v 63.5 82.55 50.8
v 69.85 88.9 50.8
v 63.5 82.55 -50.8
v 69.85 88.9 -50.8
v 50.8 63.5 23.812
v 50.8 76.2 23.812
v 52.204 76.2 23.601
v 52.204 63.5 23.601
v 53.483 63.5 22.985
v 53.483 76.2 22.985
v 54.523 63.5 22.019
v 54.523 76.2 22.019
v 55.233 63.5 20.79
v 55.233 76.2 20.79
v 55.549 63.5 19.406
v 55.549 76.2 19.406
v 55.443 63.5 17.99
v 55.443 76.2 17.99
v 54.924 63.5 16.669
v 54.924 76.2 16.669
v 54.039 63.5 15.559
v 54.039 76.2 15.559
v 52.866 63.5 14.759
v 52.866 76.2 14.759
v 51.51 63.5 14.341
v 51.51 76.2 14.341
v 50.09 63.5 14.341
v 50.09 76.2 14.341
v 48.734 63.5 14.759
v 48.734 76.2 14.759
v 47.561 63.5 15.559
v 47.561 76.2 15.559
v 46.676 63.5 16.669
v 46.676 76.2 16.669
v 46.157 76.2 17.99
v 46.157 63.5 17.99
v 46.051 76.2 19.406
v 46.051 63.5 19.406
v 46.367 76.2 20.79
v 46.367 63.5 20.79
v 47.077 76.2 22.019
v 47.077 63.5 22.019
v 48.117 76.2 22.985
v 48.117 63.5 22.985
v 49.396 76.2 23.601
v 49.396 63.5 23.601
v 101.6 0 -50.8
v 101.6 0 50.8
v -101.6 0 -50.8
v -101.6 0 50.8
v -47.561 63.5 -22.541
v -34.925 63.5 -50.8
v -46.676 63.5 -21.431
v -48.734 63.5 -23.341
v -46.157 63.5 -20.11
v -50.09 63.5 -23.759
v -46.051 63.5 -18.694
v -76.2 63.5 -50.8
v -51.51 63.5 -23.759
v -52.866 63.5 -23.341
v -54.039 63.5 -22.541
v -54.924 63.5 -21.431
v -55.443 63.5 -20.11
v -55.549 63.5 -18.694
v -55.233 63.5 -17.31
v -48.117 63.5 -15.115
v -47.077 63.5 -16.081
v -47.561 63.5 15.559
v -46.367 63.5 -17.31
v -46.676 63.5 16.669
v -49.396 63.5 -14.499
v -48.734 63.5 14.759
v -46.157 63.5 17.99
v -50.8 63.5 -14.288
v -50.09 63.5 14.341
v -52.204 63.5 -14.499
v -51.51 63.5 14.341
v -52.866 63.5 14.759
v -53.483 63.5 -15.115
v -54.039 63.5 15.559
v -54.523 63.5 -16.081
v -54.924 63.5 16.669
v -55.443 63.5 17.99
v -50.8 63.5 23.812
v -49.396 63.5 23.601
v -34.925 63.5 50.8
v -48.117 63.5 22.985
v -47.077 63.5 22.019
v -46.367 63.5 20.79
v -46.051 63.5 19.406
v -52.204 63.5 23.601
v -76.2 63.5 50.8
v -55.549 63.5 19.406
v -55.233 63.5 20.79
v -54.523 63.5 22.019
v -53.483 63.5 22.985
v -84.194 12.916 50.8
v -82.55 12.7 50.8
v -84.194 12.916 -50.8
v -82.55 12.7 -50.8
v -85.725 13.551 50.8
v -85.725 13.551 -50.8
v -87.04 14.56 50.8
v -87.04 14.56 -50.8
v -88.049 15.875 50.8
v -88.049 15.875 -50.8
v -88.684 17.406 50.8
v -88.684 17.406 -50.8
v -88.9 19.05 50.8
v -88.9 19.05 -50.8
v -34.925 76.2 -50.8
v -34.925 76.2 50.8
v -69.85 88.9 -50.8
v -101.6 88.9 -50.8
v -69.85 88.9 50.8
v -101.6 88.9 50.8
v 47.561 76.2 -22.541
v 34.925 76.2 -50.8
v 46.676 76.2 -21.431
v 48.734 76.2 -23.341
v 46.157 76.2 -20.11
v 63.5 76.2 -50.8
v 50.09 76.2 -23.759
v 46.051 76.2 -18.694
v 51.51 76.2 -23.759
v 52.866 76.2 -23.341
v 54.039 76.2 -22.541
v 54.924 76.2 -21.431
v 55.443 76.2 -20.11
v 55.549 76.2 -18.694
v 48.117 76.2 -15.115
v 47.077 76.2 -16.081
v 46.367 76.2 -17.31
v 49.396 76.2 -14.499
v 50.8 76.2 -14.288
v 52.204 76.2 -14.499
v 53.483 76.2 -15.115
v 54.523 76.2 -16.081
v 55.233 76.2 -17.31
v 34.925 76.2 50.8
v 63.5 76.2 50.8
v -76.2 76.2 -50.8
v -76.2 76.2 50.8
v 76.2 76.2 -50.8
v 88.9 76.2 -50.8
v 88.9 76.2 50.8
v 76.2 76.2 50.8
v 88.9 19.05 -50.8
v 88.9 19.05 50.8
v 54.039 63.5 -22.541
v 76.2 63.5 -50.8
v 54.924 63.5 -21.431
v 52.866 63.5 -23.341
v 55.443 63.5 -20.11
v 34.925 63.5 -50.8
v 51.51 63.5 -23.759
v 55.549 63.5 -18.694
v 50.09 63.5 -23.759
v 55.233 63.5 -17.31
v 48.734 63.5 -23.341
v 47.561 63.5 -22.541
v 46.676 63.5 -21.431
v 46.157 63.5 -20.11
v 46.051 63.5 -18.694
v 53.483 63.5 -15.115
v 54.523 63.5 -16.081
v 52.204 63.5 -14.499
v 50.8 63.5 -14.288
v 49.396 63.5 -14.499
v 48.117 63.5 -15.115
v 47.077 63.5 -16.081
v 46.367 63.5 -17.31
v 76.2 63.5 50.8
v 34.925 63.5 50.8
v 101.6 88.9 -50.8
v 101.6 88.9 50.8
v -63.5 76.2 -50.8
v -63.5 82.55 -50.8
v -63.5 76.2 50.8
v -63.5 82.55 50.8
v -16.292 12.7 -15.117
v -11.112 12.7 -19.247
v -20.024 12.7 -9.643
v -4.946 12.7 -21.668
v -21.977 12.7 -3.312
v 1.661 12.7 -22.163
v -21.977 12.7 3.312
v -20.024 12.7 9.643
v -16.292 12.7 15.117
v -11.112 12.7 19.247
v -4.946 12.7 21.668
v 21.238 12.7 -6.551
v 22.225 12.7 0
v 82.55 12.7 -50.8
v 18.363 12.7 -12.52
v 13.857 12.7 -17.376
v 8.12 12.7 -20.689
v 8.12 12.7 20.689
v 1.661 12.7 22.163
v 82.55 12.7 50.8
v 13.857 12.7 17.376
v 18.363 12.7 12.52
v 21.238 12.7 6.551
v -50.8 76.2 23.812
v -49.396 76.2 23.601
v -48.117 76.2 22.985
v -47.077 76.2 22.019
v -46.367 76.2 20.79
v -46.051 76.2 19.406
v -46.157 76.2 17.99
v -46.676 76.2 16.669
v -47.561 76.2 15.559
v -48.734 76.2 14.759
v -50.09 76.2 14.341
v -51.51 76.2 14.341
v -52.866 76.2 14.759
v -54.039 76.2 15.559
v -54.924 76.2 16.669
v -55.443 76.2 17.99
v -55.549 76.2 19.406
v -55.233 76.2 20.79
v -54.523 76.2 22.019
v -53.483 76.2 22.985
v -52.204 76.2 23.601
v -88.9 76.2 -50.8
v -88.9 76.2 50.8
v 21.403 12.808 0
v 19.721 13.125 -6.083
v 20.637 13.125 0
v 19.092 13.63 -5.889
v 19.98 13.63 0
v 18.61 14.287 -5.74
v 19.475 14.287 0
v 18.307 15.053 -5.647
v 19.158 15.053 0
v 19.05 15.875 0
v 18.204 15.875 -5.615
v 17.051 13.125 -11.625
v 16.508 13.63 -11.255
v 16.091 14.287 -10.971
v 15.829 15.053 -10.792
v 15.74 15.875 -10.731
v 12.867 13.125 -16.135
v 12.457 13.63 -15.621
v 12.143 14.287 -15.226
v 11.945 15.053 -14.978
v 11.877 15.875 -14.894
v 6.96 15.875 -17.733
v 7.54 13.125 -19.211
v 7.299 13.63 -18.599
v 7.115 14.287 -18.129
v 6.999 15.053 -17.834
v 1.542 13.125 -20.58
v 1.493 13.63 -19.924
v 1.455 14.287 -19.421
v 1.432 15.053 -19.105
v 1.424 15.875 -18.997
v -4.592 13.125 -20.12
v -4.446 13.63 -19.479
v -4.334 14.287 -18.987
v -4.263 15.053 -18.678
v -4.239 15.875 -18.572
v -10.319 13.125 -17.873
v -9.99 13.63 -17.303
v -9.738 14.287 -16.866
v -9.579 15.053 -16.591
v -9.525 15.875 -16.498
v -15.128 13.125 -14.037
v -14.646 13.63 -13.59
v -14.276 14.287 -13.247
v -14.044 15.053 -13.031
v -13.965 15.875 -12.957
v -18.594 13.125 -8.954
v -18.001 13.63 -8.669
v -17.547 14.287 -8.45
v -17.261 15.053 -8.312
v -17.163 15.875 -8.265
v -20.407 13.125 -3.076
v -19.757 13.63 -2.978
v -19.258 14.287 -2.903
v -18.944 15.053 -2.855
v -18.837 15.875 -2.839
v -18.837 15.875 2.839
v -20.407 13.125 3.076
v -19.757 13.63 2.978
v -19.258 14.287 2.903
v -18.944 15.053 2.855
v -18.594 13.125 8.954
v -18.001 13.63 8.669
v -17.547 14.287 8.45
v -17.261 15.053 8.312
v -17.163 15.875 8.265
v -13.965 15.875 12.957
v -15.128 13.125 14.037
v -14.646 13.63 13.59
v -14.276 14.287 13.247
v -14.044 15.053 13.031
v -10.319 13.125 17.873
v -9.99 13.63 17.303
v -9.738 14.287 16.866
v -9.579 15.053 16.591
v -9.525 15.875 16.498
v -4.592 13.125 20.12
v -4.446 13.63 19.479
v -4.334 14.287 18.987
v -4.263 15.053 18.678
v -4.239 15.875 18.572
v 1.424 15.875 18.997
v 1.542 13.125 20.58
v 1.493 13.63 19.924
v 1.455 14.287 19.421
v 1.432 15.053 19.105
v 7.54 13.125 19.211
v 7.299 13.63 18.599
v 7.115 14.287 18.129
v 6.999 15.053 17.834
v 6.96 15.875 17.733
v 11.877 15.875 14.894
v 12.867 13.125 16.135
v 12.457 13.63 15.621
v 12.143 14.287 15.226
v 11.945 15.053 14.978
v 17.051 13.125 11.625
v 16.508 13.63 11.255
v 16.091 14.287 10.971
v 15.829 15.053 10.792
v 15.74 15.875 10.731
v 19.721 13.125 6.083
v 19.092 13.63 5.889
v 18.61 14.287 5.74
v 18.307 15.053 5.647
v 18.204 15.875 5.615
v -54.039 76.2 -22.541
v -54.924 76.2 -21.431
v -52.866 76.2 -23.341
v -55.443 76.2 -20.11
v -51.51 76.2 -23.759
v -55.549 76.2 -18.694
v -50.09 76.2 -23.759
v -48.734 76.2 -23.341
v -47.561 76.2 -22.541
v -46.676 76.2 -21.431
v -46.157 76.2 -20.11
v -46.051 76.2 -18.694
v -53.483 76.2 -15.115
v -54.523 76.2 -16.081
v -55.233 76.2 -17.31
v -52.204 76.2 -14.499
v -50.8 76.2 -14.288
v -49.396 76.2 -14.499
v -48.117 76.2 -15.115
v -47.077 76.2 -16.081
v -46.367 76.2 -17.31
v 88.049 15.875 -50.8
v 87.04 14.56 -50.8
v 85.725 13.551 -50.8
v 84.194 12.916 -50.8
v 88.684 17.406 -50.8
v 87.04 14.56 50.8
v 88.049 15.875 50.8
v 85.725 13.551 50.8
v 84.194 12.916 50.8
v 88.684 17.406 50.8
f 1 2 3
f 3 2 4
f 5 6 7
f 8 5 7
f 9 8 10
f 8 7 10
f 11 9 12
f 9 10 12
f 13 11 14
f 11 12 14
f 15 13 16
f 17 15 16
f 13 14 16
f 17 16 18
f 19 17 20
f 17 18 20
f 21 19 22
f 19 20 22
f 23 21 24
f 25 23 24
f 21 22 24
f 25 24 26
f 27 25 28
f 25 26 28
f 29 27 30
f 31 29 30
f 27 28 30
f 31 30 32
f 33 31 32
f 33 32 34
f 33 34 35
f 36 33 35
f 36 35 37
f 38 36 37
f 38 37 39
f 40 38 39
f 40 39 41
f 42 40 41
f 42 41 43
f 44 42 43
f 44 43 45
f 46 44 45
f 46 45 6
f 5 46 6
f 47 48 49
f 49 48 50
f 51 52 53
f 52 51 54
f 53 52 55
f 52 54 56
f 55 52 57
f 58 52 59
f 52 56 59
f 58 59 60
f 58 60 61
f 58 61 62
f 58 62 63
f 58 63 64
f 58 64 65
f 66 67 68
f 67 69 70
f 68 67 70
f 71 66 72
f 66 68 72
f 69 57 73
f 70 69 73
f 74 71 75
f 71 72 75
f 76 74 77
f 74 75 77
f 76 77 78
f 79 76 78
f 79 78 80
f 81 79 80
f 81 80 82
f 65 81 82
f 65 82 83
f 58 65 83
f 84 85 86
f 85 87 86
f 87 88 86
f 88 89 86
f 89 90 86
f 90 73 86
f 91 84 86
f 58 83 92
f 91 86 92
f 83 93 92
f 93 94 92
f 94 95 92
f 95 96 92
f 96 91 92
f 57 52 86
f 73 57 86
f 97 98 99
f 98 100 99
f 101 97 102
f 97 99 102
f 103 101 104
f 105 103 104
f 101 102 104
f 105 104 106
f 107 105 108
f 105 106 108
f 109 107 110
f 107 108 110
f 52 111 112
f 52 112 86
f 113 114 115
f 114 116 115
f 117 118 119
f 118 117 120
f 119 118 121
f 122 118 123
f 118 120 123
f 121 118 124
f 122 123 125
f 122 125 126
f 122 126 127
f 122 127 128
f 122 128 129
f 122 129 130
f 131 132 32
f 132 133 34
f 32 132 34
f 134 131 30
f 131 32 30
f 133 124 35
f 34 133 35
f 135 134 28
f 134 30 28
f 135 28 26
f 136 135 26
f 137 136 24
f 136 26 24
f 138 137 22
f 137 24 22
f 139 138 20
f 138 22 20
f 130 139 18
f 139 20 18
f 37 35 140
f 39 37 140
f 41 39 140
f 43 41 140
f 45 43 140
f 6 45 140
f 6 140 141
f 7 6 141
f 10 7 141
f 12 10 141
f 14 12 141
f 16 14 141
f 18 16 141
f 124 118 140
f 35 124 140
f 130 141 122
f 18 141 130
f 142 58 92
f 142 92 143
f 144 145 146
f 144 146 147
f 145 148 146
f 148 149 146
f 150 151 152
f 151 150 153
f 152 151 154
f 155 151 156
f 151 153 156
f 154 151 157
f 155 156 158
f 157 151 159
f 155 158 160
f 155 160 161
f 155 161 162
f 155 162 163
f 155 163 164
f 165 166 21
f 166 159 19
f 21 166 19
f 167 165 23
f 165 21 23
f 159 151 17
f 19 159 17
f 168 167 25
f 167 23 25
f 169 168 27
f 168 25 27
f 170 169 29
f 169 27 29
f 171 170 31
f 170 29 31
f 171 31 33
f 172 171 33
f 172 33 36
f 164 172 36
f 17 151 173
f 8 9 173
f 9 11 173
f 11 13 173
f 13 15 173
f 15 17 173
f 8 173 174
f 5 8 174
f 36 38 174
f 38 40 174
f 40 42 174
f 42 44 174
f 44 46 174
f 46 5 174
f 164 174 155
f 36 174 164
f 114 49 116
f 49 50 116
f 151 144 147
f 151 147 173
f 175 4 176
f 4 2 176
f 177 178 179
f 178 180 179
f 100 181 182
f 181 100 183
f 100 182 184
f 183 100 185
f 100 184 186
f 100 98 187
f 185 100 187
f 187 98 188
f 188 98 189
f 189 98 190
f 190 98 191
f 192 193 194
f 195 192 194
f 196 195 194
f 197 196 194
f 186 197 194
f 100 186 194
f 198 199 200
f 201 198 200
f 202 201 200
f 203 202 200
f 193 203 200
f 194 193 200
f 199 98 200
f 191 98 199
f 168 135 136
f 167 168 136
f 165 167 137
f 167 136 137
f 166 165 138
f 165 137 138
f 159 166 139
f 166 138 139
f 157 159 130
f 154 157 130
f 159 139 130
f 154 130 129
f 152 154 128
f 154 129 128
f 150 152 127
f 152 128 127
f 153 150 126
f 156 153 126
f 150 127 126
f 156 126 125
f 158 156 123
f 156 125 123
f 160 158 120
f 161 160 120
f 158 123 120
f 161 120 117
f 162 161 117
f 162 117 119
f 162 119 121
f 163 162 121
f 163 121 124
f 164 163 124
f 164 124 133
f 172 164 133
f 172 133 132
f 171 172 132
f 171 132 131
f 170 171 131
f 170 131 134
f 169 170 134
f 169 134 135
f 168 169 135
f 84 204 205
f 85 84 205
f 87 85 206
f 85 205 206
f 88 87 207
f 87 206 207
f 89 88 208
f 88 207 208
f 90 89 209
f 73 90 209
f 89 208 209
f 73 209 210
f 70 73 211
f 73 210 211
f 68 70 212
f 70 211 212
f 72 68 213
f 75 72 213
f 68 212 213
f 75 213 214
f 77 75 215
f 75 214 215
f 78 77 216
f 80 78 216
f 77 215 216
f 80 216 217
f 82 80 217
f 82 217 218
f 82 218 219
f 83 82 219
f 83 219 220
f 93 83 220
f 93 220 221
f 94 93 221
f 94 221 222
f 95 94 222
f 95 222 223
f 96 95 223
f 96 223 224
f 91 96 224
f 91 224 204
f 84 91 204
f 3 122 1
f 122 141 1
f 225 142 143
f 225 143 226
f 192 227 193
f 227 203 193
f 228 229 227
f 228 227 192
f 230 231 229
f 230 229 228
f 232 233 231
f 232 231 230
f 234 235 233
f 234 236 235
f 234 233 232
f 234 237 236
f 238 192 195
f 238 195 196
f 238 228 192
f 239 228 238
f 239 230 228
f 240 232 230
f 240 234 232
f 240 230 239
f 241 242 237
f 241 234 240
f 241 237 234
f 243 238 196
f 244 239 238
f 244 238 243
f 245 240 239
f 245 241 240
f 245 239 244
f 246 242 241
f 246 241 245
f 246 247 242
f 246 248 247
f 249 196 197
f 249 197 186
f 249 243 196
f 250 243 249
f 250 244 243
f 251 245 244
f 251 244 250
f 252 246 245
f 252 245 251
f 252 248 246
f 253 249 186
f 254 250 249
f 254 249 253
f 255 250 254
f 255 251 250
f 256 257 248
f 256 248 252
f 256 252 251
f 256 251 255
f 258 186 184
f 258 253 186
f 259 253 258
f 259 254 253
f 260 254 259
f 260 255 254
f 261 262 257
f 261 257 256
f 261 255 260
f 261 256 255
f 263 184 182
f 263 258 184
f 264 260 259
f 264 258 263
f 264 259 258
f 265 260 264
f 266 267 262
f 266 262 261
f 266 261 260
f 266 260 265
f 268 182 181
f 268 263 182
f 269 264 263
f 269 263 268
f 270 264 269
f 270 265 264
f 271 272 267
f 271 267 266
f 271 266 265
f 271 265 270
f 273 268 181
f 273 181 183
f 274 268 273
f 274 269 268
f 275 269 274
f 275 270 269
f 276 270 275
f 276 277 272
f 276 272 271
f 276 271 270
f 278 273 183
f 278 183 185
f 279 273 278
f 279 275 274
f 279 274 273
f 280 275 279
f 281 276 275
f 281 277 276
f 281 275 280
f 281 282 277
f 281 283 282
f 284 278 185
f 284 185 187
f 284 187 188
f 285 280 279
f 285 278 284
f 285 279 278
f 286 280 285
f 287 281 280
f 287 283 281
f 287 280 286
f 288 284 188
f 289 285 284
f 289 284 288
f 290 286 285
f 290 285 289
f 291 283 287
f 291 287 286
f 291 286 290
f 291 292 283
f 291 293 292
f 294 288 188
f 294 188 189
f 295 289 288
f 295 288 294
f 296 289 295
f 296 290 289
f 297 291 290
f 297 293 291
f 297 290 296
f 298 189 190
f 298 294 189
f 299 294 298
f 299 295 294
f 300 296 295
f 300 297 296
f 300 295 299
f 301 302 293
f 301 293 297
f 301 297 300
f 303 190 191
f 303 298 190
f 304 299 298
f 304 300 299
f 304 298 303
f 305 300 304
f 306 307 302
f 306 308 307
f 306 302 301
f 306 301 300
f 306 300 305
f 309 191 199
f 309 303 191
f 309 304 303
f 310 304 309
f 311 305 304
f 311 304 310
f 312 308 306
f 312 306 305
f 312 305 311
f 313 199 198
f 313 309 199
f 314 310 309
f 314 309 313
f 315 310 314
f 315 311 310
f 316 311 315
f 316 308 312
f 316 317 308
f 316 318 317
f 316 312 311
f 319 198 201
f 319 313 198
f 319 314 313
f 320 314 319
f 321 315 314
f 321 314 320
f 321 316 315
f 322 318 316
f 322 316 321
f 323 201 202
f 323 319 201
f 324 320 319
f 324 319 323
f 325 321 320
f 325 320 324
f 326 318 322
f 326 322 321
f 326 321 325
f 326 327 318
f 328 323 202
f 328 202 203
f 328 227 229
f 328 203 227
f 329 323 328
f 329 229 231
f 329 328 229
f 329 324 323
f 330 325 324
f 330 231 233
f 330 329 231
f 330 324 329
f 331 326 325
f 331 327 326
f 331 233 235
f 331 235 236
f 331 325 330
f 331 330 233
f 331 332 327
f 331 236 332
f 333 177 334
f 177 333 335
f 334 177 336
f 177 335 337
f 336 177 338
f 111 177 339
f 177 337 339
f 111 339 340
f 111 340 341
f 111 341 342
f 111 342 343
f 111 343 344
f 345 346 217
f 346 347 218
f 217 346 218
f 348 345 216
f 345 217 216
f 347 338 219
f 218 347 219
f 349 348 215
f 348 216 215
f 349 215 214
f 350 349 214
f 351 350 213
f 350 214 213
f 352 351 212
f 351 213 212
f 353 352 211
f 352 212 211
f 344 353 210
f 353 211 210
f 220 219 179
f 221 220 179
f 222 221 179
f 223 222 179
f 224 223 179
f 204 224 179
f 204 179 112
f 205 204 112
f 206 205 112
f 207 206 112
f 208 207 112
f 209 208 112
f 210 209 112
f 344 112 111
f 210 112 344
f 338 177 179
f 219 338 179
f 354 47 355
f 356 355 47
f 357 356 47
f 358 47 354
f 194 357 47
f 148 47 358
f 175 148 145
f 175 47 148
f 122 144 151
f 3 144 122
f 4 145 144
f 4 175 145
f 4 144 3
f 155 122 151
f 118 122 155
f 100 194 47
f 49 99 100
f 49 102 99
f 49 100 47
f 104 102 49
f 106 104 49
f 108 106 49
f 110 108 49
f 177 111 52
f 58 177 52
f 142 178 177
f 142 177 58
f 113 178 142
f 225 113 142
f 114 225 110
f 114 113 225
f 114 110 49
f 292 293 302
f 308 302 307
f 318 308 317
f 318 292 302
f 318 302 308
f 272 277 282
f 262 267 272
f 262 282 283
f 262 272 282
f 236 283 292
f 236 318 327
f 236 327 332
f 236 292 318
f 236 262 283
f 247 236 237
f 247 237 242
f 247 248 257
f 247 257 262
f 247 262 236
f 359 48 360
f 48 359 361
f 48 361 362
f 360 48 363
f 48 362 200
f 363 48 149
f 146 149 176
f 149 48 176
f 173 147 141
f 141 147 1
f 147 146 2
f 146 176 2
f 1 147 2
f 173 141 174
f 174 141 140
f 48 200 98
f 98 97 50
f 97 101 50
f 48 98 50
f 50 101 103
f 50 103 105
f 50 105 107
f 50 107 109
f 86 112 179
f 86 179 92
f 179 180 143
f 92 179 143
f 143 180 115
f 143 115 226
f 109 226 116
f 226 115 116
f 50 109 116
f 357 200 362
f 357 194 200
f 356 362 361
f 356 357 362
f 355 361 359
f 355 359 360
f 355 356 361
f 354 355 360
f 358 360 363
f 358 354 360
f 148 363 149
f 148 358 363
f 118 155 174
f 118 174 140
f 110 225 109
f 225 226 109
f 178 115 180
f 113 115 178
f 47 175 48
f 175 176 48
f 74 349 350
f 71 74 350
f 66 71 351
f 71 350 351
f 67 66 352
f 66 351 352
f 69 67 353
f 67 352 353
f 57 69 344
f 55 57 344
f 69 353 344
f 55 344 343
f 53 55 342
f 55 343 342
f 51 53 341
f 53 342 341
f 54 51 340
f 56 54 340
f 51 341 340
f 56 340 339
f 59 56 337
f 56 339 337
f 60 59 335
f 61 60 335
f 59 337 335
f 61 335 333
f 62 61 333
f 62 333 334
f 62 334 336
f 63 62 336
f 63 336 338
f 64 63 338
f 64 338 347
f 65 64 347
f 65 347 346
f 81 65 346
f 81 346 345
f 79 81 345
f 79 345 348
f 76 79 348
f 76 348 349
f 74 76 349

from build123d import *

# Parameters (mm, degrees)
BOSS_EXTRUDE1_DEPTH = 50.8
CUT_EXTRUDE1_REACH  = 138.783
SKETCH2_R           = 4.7625
SKETCH3_R           = 19.05
BOSS_EXTRUDE2_DEPTH = 3.175
FILLET1_R           = 6.35
FILLET2_R           = 3.175
CHAMFER1_SIZE       = 6.35


with BuildPart() as part:
    # Sketch1 → Boss-Extrude1 (new, symmetric)
    with BuildSketch(Plane.XY):
        Polygon((34.925, 76.2), (63.5, 76.2), (63.5, 88.9), (101.6, 88.9), (101.6, 0), (-101.6, 0), (-101.6, 88.9), (-63.5, 88.9), (-63.5, 76.2), (-34.925, 76.2), (-34.925, 63.5), (-76.2, 63.5), (-76.2, 76.2), (-88.9, 76.2), (-88.9, 12.7), (88.9, 12.7), (88.9, 76.2), (76.2, 76.2), (76.2, 63.5), (34.925, 63.5), align=None)
    extrude(amount=BOSS_EXTRUDE1_DEPTH, both=True)

    # Sketch2 → Cut-Extrude1 (cut, up to next)
    with BuildSketch(Plane(origin=(0, 76.2, 0), x_dir=(1, 0, 0), z_dir=(0, 1, 0)), mode=Mode.PRIVATE) as cut_extrude1_sk1:
        with Locations(Location((-50.8, 19.05, 0), (0, 0, 270))):
            Circle(SKETCH2_R)
    cut_extrude1_tool1 = extrude(cut_extrude1_sk1.sketch, amount=-CUT_EXTRUDE1_REACH, mode=Mode.PRIVATE) & part.part
    # Sketch2 → Cut-Extrude1 (cut, up to next)
    with BuildSketch(Plane(origin=(0, 76.2, 0), x_dir=(1, 0, 0), z_dir=(0, 1, 0)), mode=Mode.PRIVATE) as cut_extrude1_sk2:
        with Locations(Location((-50.8, -19.05, 0), (0, 0, 270))):
            Circle(SKETCH2_R)
    cut_extrude1_tool2 = extrude(cut_extrude1_sk2.sketch, amount=-CUT_EXTRUDE1_REACH, mode=Mode.PRIVATE) & part.part
    # Sketch2 → Cut-Extrude1 (cut, up to next)
    with BuildSketch(Plane(origin=(0, 76.2, 0), x_dir=(1, 0, 0), z_dir=(0, 1, 0)), mode=Mode.PRIVATE) as cut_extrude1_sk3:
        with Locations(Location((50.8, 19.05, 0), (0, 0, 270))):
            Circle(SKETCH2_R)
    cut_extrude1_tool3 = extrude(cut_extrude1_sk3.sketch, amount=-CUT_EXTRUDE1_REACH, mode=Mode.PRIVATE) & part.part
    # Sketch2 → Cut-Extrude1 (cut, up to next)
    with BuildSketch(Plane(origin=(0, 76.2, 0), x_dir=(1, 0, 0), z_dir=(0, 1, 0)), mode=Mode.PRIVATE) as cut_extrude1_sk4:
        with Locations(Location((50.8, -19.05, 0), (0, 0, 270))):
            Circle(SKETCH2_R)
    cut_extrude1_tool4 = extrude(cut_extrude1_sk4.sketch, amount=-CUT_EXTRUDE1_REACH, mode=Mode.PRIVATE) & part.part
    add(cut_extrude1_tool1.solids().sort_by_distance((-50.8, 76.2, -19.05))[0], mode=Mode.SUBTRACT)
    add(cut_extrude1_tool2.solids().sort_by_distance((-50.8, 76.2, 19.05))[0], mode=Mode.SUBTRACT)
    add(cut_extrude1_tool3.solids().sort_by_distance((50.8, 76.2, -19.05))[0], mode=Mode.SUBTRACT)
    add(cut_extrude1_tool4.solids().sort_by_distance((50.8, 76.2, 19.05))[0], mode=Mode.SUBTRACT)

    # Sketch3 → Boss-Extrude2 (add, symmetric)
    with BuildSketch(Plane(origin=(0, 12.7, 0), x_dir=(1, 0, 0), z_dir=(0, 1, 0))):
        Circle(SKETCH3_R)
    extrude(amount=BOSS_EXTRUDE2_DEPTH, both=True)

    # Fillet1
    fillet1_edges = [part.edges().sort_by_distance(p)[0] for p in [
        (-88.9, 12.7, 0),
        (88.9, 12.7, 0),
    ]]
    fillet(fillet1_edges, radius=FILLET1_R)

    # Fillet2
    fillet2_edges = [part.edges().sort_by_distance(p)[0] for p in [
        (-19.05, 12.7, 0),
    ]]
    fillet(fillet2_edges, radius=FILLET2_R - 0.0001)  # a hair under: the kernel refuses the full size

    # Chamfer1
    chamfer1_edges = [part.edges().sort_by_distance(p)[0] for p in [
        (63.5, 88.9, 0),
        (-63.5, 88.9, 0),
    ]]
    chamfer(chamfer1_edges, length=CHAMFER1_SIZE)


solid = part.part
